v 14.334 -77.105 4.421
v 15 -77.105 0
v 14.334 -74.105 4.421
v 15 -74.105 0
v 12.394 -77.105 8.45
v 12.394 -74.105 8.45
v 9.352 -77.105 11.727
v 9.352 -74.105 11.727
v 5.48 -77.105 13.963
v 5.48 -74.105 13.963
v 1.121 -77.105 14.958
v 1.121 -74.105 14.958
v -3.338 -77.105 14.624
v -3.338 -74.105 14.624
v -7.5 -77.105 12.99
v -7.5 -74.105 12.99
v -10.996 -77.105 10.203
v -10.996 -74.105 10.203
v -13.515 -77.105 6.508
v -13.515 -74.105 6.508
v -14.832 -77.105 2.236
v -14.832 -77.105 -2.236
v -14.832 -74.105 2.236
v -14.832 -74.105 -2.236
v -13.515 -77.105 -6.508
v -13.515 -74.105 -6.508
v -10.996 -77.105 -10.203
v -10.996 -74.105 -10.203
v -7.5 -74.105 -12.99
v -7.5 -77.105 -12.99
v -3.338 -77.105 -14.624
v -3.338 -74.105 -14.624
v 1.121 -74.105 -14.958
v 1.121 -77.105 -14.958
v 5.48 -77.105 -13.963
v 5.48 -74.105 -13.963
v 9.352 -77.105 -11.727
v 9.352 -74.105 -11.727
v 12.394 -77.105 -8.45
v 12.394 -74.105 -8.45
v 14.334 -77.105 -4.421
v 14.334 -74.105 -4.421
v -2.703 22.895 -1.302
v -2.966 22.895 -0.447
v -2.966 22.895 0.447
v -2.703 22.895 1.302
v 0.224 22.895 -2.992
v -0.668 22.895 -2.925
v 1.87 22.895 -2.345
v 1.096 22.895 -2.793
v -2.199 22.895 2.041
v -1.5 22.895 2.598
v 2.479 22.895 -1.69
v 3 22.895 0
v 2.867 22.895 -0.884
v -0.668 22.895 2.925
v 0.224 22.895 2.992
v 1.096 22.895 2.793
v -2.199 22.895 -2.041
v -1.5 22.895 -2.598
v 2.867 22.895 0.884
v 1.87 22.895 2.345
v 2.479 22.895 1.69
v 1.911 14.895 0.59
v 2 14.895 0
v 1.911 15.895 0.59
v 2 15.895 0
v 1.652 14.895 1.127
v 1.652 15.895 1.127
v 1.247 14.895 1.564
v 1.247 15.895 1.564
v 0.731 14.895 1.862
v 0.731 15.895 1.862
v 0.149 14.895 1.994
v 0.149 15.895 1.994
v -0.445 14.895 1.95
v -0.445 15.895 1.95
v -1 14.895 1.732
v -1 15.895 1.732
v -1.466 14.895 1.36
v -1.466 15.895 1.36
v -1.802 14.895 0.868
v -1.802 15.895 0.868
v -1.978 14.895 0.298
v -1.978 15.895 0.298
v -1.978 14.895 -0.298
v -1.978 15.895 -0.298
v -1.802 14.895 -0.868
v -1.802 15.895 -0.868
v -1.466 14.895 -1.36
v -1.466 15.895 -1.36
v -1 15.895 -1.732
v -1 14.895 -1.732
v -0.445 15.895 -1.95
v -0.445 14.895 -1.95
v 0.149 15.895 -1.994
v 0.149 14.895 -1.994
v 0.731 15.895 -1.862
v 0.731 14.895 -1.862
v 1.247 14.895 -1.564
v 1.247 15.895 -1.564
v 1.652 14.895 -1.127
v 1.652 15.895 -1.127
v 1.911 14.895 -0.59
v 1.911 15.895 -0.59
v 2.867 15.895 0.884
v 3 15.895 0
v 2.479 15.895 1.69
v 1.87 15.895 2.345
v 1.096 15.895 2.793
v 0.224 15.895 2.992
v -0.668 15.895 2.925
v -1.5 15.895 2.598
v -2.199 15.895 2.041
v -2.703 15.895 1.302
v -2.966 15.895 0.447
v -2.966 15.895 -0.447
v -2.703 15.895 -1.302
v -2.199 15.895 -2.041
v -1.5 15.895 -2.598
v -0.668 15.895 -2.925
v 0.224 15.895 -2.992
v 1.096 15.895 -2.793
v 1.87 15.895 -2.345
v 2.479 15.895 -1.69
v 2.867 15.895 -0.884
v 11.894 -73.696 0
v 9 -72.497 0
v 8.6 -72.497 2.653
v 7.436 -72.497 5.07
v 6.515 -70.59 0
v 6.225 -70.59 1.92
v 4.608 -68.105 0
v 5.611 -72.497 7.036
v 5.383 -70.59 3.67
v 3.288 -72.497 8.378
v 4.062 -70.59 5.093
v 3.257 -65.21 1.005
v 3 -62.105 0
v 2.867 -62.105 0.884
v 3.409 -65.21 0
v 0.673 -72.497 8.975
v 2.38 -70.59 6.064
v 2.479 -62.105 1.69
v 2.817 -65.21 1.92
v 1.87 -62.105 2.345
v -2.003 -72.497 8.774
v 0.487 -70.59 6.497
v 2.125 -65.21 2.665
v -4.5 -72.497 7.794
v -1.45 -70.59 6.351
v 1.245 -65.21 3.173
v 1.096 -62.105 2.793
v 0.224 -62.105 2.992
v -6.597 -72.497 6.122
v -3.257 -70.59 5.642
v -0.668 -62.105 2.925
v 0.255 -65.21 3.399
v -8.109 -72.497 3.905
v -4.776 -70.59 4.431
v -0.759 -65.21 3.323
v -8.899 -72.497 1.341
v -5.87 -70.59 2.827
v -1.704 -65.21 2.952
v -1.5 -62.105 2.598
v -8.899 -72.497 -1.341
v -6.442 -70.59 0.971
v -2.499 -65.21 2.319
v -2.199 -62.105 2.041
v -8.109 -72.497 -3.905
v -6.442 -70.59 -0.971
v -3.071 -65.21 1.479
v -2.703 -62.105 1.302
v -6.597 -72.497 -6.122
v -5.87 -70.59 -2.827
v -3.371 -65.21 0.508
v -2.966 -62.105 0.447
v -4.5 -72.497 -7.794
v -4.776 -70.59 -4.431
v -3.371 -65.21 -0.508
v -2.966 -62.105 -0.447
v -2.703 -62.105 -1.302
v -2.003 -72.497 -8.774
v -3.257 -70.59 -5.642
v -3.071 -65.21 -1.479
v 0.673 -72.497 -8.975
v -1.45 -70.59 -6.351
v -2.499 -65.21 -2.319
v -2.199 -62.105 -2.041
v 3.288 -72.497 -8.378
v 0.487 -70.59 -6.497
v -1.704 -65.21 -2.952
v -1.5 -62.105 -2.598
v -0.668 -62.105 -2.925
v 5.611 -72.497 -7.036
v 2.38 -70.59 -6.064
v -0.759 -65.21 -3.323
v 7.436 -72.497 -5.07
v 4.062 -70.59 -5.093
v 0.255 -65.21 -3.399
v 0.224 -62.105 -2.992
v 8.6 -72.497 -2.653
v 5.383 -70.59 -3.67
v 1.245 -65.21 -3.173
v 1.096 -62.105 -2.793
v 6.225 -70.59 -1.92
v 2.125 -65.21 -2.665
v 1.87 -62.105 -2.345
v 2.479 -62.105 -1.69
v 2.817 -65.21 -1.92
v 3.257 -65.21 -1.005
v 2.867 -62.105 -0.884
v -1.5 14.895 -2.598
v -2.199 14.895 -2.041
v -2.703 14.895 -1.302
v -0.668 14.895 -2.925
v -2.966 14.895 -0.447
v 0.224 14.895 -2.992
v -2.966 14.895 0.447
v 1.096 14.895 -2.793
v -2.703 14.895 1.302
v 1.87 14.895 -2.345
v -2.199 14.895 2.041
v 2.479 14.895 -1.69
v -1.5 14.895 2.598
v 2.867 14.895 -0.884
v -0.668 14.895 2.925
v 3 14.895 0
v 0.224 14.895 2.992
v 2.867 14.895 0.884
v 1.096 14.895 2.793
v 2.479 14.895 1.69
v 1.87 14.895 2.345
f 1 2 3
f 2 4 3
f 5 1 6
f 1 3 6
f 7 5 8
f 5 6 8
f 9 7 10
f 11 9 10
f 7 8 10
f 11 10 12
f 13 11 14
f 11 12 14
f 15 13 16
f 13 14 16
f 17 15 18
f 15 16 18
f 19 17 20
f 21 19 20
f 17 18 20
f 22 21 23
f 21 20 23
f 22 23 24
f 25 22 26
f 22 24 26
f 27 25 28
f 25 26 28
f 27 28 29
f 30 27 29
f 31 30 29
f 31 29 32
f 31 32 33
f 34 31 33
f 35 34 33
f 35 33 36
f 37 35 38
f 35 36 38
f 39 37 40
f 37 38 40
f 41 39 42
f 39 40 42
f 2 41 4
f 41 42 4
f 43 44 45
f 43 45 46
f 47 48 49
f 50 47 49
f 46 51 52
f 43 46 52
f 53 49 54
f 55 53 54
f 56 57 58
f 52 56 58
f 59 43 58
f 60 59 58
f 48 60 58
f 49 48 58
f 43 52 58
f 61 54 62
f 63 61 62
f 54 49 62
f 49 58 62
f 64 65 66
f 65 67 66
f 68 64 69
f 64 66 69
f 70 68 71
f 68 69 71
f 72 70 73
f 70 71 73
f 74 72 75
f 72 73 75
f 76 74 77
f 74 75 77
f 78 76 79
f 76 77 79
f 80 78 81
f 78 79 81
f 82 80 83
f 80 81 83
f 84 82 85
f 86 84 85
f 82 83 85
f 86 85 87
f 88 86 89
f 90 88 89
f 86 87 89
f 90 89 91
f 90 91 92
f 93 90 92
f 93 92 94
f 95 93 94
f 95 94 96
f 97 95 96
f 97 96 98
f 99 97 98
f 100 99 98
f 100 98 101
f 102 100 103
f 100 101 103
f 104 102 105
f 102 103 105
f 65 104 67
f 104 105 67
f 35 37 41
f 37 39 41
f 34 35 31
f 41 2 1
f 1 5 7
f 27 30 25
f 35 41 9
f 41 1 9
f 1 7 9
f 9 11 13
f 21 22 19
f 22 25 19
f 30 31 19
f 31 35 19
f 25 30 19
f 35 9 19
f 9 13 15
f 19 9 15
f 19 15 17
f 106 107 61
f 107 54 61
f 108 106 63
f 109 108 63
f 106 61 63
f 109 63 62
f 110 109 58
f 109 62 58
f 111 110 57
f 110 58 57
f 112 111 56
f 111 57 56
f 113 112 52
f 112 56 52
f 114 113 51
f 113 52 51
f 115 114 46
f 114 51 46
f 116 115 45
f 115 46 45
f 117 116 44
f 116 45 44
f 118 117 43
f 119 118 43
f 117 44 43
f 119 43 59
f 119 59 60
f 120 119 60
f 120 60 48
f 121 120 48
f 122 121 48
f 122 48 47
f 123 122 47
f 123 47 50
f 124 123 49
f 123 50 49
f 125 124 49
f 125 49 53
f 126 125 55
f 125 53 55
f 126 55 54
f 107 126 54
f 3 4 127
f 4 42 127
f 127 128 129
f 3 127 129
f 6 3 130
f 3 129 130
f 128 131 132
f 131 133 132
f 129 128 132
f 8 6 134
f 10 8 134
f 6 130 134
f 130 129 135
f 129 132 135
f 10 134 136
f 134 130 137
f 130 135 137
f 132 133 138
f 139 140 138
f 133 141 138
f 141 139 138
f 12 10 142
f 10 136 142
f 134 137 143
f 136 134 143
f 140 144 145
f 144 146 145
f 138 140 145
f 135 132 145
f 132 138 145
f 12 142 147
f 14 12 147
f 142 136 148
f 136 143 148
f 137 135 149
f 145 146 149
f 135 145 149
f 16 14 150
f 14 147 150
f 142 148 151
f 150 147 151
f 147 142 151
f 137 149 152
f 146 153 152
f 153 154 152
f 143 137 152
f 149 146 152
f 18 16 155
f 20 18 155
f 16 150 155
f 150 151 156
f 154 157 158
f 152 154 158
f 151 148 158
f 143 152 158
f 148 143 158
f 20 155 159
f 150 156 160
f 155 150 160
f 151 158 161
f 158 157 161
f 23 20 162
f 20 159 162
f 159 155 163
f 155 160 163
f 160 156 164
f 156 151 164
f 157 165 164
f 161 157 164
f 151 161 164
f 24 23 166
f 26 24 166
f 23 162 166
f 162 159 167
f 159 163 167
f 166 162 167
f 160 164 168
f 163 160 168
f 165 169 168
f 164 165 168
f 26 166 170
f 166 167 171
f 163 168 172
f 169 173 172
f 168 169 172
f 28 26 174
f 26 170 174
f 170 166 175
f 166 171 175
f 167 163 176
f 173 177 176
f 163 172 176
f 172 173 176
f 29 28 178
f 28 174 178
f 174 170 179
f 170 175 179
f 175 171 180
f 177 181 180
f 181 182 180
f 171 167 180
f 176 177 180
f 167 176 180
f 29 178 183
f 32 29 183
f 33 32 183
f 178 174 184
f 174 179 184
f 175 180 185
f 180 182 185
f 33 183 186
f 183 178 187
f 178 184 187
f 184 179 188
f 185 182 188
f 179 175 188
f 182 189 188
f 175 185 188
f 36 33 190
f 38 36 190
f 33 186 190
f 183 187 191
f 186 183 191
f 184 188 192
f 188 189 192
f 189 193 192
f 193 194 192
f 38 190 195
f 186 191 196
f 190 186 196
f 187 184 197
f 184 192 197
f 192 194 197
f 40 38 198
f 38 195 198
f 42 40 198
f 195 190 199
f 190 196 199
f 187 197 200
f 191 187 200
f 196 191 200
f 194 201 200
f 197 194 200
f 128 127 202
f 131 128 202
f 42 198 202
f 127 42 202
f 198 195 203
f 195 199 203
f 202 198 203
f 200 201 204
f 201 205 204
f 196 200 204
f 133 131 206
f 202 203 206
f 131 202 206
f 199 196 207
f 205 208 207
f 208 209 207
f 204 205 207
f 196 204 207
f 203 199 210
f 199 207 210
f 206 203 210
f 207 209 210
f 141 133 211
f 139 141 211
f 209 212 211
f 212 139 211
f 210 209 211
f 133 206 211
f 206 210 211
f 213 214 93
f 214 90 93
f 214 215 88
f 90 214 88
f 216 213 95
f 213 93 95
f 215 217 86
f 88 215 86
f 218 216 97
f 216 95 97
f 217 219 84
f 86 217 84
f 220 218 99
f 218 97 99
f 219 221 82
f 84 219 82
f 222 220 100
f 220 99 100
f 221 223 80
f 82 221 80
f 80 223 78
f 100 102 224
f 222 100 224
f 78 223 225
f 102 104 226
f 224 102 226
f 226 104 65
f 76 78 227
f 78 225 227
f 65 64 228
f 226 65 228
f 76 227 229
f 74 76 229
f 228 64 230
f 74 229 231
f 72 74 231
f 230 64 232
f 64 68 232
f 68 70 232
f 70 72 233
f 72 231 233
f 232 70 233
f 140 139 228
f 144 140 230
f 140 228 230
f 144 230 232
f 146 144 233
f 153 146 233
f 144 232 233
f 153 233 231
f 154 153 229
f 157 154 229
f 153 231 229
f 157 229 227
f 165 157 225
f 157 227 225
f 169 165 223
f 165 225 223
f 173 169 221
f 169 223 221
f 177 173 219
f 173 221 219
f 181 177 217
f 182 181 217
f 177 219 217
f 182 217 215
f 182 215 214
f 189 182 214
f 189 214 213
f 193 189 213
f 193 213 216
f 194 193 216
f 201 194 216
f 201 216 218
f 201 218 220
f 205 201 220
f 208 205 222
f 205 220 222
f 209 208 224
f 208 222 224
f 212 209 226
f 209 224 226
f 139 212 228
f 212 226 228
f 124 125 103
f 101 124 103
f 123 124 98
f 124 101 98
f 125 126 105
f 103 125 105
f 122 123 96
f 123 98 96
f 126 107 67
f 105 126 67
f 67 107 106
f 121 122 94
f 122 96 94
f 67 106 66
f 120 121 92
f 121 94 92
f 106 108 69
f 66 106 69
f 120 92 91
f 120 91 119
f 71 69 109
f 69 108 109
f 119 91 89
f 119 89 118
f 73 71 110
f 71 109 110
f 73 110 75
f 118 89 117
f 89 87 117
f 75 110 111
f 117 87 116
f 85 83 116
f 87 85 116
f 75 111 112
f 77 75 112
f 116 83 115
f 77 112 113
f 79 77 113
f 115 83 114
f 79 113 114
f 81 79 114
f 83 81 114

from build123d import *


with BuildPart() as part:
    # Sketch3 → Revolve1 (revolve)
    with BuildSketch(Plane.XY):
        with BuildLine():
            Line((0, 22.895408163), (0, 0))
            Line((0, 0), (0, -77.104591837))
            Line((0, -77.104591837), (15, -77.104591837))
            Line((15, -77.104591837), (15, -74.104591837))
            ThreePointArc((15, -74.104591837), (6.514718626, -70.589873211), (3, -62.104591837))
            Line((3, -62.104591837), (3, 14.895408163))
            Line((3, 14.895408163), (2, 14.895408163))
            Line((2, 14.895408163), (2, 15.895408163))
            Line((2, 15.895408163), (3, 15.895408163))
            Line((3, 15.895408163), (3, 22.895408163))
            Line((3, 22.895408163), (0, 22.895408163))
        make_face()
    revolve(axis=Axis((0, 103.649150199, 0), (0, -1, 0)))


solid = part.part
